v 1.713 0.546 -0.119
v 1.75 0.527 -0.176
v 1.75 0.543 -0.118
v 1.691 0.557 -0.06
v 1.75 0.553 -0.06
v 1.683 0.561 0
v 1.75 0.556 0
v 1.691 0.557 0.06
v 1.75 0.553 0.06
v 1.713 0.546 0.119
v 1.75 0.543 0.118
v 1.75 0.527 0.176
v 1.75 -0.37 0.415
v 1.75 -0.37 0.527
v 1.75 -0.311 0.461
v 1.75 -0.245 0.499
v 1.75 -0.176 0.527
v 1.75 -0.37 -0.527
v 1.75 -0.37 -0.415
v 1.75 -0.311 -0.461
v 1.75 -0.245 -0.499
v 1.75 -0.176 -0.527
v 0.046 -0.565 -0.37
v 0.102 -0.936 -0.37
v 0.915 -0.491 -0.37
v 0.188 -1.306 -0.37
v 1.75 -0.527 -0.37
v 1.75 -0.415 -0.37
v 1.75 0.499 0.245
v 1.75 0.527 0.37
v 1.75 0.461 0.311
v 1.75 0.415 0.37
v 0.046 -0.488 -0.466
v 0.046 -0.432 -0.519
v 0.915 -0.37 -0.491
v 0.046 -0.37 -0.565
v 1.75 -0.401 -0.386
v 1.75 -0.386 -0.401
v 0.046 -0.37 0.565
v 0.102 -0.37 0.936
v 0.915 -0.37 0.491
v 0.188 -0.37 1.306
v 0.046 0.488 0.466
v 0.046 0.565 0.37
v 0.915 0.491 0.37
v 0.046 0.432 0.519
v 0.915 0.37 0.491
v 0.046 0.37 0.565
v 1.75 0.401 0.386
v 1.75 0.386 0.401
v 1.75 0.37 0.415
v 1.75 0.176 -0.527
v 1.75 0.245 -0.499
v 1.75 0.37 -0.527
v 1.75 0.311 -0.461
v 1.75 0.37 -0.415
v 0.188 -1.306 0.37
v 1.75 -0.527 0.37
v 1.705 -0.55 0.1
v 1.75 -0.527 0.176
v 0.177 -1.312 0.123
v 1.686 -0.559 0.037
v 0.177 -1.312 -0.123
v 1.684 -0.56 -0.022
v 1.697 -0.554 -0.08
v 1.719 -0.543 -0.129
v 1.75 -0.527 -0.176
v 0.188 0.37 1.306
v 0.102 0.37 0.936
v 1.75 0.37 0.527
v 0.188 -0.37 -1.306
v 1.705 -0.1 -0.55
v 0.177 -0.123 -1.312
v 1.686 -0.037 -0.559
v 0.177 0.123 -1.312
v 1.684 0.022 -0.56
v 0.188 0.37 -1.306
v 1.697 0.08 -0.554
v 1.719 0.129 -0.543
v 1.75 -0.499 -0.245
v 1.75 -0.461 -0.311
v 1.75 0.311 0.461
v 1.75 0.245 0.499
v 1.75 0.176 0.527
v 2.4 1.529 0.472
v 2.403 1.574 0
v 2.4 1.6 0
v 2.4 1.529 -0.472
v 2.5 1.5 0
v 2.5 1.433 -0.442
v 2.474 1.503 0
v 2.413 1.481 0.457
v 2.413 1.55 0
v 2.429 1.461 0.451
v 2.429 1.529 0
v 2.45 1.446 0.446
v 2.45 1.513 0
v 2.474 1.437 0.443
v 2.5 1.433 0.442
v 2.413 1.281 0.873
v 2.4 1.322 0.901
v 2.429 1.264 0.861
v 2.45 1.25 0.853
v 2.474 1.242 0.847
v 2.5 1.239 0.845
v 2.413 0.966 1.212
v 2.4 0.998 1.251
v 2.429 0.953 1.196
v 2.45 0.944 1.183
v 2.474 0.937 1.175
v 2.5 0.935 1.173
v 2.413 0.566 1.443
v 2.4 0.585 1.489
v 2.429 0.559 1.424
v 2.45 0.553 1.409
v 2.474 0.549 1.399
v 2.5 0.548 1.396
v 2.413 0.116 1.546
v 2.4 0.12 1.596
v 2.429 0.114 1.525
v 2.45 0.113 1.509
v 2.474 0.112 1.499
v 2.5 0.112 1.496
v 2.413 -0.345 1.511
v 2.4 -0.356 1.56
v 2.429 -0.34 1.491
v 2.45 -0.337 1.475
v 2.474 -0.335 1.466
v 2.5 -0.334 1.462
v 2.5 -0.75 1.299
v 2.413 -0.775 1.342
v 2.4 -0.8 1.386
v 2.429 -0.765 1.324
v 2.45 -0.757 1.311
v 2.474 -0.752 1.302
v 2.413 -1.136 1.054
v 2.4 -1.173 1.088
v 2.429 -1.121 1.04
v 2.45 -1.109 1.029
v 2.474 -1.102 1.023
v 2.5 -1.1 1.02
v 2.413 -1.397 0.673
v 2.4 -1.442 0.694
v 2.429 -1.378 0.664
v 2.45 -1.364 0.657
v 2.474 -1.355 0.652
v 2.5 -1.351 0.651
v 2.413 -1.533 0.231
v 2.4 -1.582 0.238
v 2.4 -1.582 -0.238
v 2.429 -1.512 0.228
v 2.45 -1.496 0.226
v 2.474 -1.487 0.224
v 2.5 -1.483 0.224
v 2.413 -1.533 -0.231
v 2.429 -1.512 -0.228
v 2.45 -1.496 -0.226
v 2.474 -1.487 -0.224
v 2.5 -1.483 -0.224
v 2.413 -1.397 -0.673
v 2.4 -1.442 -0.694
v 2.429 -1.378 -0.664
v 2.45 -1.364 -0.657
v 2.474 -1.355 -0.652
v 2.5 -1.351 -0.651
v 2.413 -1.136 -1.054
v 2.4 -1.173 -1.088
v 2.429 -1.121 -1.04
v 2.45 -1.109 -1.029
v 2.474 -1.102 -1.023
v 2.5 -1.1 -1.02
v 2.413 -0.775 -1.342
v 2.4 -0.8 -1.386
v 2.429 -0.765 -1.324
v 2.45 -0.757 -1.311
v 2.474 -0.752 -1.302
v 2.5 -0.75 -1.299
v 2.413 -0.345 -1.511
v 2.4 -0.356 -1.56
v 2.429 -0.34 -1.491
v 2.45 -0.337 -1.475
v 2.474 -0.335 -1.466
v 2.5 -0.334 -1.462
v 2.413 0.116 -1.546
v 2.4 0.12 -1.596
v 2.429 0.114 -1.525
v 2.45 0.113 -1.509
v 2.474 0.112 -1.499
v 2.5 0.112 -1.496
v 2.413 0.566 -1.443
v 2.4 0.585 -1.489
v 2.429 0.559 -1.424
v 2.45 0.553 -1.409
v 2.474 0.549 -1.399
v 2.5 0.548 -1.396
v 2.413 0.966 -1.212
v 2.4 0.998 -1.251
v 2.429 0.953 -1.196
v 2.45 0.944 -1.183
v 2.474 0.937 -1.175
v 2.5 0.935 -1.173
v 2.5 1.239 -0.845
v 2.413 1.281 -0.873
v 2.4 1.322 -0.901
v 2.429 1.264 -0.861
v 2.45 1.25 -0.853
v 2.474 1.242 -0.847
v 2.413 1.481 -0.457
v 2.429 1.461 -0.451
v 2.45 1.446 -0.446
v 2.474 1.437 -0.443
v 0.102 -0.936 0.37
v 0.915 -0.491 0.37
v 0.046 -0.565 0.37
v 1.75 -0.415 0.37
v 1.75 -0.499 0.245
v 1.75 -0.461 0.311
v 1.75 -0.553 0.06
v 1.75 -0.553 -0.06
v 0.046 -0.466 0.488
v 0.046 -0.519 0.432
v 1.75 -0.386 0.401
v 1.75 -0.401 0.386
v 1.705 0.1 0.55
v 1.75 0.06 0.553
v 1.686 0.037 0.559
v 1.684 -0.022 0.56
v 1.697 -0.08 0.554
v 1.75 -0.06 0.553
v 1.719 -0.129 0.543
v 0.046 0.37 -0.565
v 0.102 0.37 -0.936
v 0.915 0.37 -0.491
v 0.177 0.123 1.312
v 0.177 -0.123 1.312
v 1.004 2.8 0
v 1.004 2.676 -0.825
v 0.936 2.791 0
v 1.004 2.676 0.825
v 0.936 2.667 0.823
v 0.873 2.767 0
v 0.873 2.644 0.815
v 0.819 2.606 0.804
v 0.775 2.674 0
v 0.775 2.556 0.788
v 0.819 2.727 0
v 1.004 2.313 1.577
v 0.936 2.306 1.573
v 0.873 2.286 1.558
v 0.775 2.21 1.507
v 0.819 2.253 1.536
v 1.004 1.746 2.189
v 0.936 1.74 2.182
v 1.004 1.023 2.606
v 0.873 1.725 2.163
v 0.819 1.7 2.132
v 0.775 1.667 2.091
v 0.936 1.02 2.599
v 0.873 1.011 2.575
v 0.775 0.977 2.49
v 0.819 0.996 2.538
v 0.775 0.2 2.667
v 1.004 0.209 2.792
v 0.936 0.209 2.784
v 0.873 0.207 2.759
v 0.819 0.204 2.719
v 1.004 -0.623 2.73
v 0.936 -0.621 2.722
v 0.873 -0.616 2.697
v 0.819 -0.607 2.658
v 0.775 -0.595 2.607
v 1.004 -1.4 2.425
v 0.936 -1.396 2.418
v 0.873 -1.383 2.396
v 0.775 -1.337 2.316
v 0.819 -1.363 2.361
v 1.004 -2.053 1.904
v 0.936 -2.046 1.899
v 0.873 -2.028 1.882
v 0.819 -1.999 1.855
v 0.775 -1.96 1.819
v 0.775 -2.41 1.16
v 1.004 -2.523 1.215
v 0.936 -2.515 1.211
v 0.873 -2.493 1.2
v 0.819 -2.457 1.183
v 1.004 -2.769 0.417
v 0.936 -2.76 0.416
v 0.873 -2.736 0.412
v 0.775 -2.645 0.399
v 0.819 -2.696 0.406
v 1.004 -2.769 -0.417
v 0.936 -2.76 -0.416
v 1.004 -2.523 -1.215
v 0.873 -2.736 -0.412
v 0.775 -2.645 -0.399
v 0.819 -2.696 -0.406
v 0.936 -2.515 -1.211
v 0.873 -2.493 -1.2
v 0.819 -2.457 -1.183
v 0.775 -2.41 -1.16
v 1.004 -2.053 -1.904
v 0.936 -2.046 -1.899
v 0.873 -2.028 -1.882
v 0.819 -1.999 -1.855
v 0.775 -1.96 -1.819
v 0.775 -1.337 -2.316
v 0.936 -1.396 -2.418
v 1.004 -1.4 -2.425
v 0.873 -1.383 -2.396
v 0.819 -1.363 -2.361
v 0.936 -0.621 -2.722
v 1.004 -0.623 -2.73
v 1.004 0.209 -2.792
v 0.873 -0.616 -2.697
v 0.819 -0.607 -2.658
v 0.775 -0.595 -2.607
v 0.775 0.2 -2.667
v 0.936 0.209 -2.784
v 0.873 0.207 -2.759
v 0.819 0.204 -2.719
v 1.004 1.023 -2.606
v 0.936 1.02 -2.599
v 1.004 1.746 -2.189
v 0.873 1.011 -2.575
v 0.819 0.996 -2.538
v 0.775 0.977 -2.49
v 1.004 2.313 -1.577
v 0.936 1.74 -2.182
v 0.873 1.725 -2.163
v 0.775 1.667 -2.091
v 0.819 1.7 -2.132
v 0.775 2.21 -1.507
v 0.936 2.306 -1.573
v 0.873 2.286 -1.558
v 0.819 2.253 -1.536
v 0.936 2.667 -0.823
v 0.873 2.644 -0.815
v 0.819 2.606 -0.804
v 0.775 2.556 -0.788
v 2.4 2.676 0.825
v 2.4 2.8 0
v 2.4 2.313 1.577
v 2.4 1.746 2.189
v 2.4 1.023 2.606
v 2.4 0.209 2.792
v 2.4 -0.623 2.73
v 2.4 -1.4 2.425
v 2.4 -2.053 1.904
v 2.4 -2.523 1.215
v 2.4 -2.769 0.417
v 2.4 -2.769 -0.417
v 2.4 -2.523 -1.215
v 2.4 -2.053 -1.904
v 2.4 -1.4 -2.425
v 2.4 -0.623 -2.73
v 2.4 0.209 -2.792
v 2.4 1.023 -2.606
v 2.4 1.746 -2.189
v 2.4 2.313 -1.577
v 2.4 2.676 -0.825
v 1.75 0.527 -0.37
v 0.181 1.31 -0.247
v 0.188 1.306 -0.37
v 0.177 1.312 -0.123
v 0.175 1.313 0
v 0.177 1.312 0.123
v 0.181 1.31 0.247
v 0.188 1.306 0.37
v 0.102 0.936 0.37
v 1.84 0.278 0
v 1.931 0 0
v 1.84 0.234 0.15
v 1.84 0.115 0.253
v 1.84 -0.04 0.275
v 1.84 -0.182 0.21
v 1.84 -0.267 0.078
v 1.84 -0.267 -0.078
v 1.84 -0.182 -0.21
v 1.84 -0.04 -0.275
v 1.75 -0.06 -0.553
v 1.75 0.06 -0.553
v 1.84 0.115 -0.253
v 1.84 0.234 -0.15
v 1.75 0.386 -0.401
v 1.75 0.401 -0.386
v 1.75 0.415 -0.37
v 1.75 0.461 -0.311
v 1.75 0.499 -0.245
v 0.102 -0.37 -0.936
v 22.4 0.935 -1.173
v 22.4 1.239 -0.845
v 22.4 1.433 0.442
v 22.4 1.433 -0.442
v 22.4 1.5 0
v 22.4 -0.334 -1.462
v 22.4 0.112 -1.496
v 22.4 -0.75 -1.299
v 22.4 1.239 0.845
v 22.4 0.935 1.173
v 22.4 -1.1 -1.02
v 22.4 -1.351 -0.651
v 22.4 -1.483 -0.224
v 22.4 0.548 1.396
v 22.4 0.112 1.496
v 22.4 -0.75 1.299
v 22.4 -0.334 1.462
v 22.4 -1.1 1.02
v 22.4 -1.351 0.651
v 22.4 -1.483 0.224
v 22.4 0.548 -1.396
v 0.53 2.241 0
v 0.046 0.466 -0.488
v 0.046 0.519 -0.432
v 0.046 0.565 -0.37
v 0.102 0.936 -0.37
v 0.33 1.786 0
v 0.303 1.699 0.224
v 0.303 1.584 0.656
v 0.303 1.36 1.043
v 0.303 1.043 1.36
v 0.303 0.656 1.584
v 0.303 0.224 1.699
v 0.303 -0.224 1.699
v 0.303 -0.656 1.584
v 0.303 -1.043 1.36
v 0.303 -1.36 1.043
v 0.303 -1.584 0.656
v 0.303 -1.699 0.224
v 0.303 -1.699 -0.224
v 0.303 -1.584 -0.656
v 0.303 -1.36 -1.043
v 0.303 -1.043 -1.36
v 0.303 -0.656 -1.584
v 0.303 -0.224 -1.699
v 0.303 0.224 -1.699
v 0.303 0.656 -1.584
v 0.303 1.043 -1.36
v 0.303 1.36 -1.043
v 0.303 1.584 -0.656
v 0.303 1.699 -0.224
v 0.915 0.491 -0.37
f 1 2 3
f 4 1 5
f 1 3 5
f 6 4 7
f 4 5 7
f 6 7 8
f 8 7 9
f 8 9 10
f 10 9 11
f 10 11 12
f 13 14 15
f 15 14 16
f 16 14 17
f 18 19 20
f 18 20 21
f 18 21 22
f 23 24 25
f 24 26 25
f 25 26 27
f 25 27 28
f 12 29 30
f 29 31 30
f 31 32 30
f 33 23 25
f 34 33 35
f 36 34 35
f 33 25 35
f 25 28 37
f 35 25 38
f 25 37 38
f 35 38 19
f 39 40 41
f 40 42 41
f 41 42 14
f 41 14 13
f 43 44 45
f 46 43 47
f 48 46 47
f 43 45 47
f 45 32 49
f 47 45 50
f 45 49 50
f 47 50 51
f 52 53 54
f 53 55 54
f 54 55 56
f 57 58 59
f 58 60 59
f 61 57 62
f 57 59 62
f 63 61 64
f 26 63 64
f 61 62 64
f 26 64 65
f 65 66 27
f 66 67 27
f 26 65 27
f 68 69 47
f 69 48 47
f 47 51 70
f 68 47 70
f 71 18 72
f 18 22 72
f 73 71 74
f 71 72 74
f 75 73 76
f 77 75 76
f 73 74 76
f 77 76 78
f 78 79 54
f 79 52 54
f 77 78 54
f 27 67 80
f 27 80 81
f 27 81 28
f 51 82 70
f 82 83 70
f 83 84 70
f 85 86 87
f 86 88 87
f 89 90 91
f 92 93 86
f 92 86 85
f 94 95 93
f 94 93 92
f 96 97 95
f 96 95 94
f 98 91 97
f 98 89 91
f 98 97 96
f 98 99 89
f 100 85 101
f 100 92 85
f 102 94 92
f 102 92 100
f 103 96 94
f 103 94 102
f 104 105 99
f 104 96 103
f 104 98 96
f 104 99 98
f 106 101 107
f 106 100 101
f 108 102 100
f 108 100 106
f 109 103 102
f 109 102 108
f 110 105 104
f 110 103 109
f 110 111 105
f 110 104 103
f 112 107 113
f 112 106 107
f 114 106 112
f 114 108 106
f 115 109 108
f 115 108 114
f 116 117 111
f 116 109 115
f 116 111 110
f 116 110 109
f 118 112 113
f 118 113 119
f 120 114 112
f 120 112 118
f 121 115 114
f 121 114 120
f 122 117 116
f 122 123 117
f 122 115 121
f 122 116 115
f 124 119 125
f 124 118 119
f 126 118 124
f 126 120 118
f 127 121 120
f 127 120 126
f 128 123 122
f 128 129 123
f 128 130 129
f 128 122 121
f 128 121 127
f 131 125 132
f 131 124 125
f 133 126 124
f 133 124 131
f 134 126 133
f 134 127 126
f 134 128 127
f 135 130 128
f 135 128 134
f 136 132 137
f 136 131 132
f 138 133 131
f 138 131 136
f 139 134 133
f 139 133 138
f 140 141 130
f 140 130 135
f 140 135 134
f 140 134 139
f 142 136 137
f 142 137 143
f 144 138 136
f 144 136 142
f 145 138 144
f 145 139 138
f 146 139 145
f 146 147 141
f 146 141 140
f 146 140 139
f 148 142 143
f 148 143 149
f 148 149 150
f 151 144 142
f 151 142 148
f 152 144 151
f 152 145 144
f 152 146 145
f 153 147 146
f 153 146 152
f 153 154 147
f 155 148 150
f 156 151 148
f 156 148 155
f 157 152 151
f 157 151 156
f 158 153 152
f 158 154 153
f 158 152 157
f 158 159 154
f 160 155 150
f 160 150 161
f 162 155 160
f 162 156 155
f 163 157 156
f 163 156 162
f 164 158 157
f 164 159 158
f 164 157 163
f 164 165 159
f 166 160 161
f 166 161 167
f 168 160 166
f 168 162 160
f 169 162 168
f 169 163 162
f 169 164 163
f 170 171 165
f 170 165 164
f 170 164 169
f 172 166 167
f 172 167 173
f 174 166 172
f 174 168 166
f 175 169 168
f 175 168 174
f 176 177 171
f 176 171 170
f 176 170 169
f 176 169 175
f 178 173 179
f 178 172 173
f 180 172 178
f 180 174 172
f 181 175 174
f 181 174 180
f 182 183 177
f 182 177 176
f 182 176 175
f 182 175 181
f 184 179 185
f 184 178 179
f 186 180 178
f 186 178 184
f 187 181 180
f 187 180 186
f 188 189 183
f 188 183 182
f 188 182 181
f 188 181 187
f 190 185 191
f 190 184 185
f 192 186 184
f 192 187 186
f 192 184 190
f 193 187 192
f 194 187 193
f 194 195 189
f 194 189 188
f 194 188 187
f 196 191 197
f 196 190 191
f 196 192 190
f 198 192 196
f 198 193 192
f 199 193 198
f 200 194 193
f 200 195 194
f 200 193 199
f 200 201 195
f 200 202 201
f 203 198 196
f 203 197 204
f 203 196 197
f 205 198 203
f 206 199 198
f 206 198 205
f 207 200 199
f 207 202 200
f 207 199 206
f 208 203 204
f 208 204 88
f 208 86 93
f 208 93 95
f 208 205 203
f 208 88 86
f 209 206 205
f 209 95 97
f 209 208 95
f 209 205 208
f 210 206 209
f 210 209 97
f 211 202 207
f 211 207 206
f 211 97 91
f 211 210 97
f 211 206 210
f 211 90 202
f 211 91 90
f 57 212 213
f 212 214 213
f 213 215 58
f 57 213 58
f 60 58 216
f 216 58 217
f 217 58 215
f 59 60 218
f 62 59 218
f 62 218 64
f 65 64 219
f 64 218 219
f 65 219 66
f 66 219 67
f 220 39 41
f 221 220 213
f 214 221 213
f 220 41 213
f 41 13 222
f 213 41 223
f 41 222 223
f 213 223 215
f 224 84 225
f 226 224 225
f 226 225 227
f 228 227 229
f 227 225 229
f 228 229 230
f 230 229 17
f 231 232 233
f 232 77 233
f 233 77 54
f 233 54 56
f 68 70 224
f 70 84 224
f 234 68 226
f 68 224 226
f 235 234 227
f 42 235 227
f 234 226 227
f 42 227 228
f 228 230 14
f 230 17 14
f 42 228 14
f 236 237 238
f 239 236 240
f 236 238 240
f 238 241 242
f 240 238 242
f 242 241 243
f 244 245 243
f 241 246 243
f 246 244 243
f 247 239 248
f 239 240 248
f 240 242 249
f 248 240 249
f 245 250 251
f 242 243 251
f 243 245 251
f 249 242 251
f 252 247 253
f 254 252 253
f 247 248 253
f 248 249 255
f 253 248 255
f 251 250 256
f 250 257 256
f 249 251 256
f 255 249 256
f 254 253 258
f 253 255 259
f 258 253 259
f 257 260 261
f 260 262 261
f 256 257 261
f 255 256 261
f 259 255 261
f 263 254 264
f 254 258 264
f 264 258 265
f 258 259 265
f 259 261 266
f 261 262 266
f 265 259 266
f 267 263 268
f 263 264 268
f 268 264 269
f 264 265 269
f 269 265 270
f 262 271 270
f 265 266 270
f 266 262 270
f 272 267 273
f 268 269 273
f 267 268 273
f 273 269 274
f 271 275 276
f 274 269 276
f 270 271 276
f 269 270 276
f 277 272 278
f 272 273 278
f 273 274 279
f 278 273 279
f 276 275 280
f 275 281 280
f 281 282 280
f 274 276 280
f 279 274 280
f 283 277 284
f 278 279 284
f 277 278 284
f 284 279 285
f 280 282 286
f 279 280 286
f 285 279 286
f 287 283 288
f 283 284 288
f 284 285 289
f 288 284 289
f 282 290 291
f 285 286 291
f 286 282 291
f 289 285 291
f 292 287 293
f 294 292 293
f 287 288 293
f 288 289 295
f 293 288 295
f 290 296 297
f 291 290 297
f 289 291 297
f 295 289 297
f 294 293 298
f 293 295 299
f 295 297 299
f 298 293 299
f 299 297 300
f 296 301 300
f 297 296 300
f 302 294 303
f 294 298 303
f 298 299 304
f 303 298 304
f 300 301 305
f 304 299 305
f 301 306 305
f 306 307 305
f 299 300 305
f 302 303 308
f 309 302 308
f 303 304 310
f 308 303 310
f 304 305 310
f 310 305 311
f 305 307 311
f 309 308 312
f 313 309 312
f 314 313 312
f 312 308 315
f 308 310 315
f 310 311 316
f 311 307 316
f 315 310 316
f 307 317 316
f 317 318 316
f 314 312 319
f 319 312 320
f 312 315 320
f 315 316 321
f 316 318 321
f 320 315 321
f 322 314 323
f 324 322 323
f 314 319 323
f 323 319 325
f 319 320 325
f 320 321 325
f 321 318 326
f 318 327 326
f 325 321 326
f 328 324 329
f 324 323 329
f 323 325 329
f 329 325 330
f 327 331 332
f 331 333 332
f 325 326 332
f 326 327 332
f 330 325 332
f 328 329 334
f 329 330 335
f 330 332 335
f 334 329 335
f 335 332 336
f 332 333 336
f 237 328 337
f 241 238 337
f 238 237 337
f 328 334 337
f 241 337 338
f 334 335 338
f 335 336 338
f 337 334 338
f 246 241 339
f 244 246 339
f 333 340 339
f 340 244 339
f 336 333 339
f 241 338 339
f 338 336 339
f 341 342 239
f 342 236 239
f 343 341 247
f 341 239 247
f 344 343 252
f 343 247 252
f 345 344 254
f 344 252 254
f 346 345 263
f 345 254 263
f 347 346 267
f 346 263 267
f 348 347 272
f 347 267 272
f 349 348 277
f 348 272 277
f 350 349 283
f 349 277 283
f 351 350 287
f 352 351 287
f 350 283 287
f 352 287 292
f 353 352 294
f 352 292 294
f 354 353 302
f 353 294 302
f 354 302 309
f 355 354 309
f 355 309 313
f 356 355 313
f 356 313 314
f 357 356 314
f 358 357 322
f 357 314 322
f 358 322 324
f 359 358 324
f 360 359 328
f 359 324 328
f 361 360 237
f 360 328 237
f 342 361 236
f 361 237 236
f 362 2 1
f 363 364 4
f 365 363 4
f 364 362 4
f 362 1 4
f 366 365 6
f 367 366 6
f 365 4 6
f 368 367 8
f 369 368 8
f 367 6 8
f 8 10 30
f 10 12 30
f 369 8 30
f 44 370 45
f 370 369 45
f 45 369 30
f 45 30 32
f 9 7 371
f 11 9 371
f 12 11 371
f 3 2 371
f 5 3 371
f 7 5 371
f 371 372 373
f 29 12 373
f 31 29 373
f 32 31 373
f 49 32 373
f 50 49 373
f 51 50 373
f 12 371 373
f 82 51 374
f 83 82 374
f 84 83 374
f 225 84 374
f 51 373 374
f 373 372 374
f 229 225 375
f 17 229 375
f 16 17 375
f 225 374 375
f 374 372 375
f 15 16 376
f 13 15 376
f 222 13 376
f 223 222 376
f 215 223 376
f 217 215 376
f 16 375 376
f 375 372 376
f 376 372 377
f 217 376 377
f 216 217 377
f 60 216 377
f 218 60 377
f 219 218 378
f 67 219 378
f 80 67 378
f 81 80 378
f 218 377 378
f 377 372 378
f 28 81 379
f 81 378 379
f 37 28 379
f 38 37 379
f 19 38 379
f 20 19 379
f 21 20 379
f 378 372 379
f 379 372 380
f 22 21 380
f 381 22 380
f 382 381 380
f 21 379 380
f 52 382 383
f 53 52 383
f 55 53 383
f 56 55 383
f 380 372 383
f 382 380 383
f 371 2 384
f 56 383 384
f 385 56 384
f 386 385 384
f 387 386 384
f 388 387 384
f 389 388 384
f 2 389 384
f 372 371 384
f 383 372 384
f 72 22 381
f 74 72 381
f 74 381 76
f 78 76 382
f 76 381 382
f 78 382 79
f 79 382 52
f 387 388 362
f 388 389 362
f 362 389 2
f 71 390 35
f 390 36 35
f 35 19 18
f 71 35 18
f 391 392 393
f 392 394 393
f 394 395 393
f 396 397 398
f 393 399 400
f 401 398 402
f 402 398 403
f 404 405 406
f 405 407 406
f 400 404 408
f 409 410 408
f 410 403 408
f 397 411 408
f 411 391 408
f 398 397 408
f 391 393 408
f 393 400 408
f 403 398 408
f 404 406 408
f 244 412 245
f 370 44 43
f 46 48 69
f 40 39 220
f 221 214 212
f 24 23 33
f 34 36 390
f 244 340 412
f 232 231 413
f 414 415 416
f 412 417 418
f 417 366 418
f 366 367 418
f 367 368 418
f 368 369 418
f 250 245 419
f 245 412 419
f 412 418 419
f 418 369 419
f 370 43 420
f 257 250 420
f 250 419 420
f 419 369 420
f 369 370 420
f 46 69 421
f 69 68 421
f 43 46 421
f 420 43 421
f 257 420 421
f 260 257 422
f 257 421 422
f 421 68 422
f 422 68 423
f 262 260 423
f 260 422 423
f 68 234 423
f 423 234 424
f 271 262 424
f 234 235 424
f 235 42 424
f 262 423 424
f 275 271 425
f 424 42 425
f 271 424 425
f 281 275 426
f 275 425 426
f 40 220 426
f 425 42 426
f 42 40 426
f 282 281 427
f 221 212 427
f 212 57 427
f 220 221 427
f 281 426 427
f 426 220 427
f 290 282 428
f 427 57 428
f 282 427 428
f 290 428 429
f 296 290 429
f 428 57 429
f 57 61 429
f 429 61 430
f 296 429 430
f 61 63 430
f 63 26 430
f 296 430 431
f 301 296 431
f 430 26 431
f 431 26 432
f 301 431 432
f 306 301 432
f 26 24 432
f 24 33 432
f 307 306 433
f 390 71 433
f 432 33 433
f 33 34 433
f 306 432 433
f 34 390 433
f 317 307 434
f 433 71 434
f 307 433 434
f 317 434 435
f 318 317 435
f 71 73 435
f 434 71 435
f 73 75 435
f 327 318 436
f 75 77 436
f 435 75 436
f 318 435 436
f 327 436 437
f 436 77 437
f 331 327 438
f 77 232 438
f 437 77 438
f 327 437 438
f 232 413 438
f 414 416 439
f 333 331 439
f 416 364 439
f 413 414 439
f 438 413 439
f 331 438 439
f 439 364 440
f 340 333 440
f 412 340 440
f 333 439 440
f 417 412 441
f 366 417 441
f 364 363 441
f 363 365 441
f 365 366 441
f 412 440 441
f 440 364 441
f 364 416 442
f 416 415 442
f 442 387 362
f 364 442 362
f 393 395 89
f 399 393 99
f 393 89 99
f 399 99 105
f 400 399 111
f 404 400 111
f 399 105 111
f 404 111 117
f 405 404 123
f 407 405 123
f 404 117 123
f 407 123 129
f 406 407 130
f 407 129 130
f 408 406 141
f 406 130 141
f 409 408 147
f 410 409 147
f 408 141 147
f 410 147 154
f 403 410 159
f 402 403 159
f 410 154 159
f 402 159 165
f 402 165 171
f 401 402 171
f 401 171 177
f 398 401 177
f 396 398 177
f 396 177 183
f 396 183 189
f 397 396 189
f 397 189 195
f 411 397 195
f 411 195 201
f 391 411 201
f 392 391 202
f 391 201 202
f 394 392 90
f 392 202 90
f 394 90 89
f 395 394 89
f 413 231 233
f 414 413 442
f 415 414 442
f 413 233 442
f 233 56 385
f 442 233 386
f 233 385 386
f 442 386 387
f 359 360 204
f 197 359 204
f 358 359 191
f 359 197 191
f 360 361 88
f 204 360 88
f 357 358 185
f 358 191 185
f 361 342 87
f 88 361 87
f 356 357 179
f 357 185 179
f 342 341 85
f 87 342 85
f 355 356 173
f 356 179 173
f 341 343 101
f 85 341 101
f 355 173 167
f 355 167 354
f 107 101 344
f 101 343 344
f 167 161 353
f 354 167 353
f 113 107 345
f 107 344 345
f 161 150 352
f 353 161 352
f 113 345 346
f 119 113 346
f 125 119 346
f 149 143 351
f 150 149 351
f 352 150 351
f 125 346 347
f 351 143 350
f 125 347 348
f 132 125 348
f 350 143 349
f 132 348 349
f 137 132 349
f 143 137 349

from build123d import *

# Parameters (mm, degrees)
FILLET1_R    = 0.1
SKETCH3_W    = 0.74
SKETCH3_H    = 2.8
SKETCH4_W    = 0.74
SKETCH4_H    = 1.054964432
RECPAT_COUNT = 2
RECPAT_ANGLE = 90


with BuildPart() as part:
    # BodySke → Base-Revolve (revolve)
    with BuildSketch(Plane.XY):
        with BuildLine():
            Line((2.4, 1.5), (2.4, 2.8))
            Line((2.4, 2.8), (1.003501533, 2.8))
            ThreePointArc((1.003501533, 2.8), (0.873295971, 2.76653015), (0.775371599, 2.674418605))
            ThreePointArc((0.775371599, 2.674418605), (0.197753546, 1.392274756), (0, 0))
            Line((0, 0), (22.4, 0))
            Line((22.4, 0), (22.4, 1.5))
            Line((22.4, 1.5), (2.4, 1.5))
        make_face()
    revolve(axis=Axis((-25.4, 0, 0), (1, 0, 0)))

    # Fillet1
    fillet1_edges = [part.edges().sort_by_distance(p)[0] for p in [
        (2.4, -1.5, 0),
    ]]
    fillet(fillet1_edges, radius=FILLET1_R)

    # Sketch3 → Recess section 0
    with BuildSketch(Plane(origin=(0, 0, 0), x_dir=(0, 0, -1), z_dir=(1, 0, 0))):
        Rectangle(SKETCH3_W, SKETCH3_H)
    # Sketch4 → Recess section 1
    with BuildSketch(Plane(origin=(1.75, 0, 0), x_dir=(0, 0, -1), z_dir=(1, 0, 0))):
        Rectangle(SKETCH4_W, SKETCH4_H)
    recess = loft(mode=Mode.SUBTRACT)

    # RecPat: Recess ×2 about axis
    recpat_axis = Axis((0, 0, 0), (1, 0, 0))
    for i in range(1, RECPAT_COUNT):
        add(recess.rotate(recpat_axis, i * RECPAT_ANGLE / (RECPAT_COUNT - 1)), mode=Mode.SUBTRACT)

    # RecCorSke → RecessCore (revolve, cut)
    with BuildSketch(Plane.XY):
        Polygon((0, 0), (0, 0.678371921), (1.75, 0.556), (1.930655351, 0), align=None)
    revolve(axis=Axis((-3.175, 0, 0), (1, 0, 0)), mode=Mode.SUBTRACT)


solid = part.part
